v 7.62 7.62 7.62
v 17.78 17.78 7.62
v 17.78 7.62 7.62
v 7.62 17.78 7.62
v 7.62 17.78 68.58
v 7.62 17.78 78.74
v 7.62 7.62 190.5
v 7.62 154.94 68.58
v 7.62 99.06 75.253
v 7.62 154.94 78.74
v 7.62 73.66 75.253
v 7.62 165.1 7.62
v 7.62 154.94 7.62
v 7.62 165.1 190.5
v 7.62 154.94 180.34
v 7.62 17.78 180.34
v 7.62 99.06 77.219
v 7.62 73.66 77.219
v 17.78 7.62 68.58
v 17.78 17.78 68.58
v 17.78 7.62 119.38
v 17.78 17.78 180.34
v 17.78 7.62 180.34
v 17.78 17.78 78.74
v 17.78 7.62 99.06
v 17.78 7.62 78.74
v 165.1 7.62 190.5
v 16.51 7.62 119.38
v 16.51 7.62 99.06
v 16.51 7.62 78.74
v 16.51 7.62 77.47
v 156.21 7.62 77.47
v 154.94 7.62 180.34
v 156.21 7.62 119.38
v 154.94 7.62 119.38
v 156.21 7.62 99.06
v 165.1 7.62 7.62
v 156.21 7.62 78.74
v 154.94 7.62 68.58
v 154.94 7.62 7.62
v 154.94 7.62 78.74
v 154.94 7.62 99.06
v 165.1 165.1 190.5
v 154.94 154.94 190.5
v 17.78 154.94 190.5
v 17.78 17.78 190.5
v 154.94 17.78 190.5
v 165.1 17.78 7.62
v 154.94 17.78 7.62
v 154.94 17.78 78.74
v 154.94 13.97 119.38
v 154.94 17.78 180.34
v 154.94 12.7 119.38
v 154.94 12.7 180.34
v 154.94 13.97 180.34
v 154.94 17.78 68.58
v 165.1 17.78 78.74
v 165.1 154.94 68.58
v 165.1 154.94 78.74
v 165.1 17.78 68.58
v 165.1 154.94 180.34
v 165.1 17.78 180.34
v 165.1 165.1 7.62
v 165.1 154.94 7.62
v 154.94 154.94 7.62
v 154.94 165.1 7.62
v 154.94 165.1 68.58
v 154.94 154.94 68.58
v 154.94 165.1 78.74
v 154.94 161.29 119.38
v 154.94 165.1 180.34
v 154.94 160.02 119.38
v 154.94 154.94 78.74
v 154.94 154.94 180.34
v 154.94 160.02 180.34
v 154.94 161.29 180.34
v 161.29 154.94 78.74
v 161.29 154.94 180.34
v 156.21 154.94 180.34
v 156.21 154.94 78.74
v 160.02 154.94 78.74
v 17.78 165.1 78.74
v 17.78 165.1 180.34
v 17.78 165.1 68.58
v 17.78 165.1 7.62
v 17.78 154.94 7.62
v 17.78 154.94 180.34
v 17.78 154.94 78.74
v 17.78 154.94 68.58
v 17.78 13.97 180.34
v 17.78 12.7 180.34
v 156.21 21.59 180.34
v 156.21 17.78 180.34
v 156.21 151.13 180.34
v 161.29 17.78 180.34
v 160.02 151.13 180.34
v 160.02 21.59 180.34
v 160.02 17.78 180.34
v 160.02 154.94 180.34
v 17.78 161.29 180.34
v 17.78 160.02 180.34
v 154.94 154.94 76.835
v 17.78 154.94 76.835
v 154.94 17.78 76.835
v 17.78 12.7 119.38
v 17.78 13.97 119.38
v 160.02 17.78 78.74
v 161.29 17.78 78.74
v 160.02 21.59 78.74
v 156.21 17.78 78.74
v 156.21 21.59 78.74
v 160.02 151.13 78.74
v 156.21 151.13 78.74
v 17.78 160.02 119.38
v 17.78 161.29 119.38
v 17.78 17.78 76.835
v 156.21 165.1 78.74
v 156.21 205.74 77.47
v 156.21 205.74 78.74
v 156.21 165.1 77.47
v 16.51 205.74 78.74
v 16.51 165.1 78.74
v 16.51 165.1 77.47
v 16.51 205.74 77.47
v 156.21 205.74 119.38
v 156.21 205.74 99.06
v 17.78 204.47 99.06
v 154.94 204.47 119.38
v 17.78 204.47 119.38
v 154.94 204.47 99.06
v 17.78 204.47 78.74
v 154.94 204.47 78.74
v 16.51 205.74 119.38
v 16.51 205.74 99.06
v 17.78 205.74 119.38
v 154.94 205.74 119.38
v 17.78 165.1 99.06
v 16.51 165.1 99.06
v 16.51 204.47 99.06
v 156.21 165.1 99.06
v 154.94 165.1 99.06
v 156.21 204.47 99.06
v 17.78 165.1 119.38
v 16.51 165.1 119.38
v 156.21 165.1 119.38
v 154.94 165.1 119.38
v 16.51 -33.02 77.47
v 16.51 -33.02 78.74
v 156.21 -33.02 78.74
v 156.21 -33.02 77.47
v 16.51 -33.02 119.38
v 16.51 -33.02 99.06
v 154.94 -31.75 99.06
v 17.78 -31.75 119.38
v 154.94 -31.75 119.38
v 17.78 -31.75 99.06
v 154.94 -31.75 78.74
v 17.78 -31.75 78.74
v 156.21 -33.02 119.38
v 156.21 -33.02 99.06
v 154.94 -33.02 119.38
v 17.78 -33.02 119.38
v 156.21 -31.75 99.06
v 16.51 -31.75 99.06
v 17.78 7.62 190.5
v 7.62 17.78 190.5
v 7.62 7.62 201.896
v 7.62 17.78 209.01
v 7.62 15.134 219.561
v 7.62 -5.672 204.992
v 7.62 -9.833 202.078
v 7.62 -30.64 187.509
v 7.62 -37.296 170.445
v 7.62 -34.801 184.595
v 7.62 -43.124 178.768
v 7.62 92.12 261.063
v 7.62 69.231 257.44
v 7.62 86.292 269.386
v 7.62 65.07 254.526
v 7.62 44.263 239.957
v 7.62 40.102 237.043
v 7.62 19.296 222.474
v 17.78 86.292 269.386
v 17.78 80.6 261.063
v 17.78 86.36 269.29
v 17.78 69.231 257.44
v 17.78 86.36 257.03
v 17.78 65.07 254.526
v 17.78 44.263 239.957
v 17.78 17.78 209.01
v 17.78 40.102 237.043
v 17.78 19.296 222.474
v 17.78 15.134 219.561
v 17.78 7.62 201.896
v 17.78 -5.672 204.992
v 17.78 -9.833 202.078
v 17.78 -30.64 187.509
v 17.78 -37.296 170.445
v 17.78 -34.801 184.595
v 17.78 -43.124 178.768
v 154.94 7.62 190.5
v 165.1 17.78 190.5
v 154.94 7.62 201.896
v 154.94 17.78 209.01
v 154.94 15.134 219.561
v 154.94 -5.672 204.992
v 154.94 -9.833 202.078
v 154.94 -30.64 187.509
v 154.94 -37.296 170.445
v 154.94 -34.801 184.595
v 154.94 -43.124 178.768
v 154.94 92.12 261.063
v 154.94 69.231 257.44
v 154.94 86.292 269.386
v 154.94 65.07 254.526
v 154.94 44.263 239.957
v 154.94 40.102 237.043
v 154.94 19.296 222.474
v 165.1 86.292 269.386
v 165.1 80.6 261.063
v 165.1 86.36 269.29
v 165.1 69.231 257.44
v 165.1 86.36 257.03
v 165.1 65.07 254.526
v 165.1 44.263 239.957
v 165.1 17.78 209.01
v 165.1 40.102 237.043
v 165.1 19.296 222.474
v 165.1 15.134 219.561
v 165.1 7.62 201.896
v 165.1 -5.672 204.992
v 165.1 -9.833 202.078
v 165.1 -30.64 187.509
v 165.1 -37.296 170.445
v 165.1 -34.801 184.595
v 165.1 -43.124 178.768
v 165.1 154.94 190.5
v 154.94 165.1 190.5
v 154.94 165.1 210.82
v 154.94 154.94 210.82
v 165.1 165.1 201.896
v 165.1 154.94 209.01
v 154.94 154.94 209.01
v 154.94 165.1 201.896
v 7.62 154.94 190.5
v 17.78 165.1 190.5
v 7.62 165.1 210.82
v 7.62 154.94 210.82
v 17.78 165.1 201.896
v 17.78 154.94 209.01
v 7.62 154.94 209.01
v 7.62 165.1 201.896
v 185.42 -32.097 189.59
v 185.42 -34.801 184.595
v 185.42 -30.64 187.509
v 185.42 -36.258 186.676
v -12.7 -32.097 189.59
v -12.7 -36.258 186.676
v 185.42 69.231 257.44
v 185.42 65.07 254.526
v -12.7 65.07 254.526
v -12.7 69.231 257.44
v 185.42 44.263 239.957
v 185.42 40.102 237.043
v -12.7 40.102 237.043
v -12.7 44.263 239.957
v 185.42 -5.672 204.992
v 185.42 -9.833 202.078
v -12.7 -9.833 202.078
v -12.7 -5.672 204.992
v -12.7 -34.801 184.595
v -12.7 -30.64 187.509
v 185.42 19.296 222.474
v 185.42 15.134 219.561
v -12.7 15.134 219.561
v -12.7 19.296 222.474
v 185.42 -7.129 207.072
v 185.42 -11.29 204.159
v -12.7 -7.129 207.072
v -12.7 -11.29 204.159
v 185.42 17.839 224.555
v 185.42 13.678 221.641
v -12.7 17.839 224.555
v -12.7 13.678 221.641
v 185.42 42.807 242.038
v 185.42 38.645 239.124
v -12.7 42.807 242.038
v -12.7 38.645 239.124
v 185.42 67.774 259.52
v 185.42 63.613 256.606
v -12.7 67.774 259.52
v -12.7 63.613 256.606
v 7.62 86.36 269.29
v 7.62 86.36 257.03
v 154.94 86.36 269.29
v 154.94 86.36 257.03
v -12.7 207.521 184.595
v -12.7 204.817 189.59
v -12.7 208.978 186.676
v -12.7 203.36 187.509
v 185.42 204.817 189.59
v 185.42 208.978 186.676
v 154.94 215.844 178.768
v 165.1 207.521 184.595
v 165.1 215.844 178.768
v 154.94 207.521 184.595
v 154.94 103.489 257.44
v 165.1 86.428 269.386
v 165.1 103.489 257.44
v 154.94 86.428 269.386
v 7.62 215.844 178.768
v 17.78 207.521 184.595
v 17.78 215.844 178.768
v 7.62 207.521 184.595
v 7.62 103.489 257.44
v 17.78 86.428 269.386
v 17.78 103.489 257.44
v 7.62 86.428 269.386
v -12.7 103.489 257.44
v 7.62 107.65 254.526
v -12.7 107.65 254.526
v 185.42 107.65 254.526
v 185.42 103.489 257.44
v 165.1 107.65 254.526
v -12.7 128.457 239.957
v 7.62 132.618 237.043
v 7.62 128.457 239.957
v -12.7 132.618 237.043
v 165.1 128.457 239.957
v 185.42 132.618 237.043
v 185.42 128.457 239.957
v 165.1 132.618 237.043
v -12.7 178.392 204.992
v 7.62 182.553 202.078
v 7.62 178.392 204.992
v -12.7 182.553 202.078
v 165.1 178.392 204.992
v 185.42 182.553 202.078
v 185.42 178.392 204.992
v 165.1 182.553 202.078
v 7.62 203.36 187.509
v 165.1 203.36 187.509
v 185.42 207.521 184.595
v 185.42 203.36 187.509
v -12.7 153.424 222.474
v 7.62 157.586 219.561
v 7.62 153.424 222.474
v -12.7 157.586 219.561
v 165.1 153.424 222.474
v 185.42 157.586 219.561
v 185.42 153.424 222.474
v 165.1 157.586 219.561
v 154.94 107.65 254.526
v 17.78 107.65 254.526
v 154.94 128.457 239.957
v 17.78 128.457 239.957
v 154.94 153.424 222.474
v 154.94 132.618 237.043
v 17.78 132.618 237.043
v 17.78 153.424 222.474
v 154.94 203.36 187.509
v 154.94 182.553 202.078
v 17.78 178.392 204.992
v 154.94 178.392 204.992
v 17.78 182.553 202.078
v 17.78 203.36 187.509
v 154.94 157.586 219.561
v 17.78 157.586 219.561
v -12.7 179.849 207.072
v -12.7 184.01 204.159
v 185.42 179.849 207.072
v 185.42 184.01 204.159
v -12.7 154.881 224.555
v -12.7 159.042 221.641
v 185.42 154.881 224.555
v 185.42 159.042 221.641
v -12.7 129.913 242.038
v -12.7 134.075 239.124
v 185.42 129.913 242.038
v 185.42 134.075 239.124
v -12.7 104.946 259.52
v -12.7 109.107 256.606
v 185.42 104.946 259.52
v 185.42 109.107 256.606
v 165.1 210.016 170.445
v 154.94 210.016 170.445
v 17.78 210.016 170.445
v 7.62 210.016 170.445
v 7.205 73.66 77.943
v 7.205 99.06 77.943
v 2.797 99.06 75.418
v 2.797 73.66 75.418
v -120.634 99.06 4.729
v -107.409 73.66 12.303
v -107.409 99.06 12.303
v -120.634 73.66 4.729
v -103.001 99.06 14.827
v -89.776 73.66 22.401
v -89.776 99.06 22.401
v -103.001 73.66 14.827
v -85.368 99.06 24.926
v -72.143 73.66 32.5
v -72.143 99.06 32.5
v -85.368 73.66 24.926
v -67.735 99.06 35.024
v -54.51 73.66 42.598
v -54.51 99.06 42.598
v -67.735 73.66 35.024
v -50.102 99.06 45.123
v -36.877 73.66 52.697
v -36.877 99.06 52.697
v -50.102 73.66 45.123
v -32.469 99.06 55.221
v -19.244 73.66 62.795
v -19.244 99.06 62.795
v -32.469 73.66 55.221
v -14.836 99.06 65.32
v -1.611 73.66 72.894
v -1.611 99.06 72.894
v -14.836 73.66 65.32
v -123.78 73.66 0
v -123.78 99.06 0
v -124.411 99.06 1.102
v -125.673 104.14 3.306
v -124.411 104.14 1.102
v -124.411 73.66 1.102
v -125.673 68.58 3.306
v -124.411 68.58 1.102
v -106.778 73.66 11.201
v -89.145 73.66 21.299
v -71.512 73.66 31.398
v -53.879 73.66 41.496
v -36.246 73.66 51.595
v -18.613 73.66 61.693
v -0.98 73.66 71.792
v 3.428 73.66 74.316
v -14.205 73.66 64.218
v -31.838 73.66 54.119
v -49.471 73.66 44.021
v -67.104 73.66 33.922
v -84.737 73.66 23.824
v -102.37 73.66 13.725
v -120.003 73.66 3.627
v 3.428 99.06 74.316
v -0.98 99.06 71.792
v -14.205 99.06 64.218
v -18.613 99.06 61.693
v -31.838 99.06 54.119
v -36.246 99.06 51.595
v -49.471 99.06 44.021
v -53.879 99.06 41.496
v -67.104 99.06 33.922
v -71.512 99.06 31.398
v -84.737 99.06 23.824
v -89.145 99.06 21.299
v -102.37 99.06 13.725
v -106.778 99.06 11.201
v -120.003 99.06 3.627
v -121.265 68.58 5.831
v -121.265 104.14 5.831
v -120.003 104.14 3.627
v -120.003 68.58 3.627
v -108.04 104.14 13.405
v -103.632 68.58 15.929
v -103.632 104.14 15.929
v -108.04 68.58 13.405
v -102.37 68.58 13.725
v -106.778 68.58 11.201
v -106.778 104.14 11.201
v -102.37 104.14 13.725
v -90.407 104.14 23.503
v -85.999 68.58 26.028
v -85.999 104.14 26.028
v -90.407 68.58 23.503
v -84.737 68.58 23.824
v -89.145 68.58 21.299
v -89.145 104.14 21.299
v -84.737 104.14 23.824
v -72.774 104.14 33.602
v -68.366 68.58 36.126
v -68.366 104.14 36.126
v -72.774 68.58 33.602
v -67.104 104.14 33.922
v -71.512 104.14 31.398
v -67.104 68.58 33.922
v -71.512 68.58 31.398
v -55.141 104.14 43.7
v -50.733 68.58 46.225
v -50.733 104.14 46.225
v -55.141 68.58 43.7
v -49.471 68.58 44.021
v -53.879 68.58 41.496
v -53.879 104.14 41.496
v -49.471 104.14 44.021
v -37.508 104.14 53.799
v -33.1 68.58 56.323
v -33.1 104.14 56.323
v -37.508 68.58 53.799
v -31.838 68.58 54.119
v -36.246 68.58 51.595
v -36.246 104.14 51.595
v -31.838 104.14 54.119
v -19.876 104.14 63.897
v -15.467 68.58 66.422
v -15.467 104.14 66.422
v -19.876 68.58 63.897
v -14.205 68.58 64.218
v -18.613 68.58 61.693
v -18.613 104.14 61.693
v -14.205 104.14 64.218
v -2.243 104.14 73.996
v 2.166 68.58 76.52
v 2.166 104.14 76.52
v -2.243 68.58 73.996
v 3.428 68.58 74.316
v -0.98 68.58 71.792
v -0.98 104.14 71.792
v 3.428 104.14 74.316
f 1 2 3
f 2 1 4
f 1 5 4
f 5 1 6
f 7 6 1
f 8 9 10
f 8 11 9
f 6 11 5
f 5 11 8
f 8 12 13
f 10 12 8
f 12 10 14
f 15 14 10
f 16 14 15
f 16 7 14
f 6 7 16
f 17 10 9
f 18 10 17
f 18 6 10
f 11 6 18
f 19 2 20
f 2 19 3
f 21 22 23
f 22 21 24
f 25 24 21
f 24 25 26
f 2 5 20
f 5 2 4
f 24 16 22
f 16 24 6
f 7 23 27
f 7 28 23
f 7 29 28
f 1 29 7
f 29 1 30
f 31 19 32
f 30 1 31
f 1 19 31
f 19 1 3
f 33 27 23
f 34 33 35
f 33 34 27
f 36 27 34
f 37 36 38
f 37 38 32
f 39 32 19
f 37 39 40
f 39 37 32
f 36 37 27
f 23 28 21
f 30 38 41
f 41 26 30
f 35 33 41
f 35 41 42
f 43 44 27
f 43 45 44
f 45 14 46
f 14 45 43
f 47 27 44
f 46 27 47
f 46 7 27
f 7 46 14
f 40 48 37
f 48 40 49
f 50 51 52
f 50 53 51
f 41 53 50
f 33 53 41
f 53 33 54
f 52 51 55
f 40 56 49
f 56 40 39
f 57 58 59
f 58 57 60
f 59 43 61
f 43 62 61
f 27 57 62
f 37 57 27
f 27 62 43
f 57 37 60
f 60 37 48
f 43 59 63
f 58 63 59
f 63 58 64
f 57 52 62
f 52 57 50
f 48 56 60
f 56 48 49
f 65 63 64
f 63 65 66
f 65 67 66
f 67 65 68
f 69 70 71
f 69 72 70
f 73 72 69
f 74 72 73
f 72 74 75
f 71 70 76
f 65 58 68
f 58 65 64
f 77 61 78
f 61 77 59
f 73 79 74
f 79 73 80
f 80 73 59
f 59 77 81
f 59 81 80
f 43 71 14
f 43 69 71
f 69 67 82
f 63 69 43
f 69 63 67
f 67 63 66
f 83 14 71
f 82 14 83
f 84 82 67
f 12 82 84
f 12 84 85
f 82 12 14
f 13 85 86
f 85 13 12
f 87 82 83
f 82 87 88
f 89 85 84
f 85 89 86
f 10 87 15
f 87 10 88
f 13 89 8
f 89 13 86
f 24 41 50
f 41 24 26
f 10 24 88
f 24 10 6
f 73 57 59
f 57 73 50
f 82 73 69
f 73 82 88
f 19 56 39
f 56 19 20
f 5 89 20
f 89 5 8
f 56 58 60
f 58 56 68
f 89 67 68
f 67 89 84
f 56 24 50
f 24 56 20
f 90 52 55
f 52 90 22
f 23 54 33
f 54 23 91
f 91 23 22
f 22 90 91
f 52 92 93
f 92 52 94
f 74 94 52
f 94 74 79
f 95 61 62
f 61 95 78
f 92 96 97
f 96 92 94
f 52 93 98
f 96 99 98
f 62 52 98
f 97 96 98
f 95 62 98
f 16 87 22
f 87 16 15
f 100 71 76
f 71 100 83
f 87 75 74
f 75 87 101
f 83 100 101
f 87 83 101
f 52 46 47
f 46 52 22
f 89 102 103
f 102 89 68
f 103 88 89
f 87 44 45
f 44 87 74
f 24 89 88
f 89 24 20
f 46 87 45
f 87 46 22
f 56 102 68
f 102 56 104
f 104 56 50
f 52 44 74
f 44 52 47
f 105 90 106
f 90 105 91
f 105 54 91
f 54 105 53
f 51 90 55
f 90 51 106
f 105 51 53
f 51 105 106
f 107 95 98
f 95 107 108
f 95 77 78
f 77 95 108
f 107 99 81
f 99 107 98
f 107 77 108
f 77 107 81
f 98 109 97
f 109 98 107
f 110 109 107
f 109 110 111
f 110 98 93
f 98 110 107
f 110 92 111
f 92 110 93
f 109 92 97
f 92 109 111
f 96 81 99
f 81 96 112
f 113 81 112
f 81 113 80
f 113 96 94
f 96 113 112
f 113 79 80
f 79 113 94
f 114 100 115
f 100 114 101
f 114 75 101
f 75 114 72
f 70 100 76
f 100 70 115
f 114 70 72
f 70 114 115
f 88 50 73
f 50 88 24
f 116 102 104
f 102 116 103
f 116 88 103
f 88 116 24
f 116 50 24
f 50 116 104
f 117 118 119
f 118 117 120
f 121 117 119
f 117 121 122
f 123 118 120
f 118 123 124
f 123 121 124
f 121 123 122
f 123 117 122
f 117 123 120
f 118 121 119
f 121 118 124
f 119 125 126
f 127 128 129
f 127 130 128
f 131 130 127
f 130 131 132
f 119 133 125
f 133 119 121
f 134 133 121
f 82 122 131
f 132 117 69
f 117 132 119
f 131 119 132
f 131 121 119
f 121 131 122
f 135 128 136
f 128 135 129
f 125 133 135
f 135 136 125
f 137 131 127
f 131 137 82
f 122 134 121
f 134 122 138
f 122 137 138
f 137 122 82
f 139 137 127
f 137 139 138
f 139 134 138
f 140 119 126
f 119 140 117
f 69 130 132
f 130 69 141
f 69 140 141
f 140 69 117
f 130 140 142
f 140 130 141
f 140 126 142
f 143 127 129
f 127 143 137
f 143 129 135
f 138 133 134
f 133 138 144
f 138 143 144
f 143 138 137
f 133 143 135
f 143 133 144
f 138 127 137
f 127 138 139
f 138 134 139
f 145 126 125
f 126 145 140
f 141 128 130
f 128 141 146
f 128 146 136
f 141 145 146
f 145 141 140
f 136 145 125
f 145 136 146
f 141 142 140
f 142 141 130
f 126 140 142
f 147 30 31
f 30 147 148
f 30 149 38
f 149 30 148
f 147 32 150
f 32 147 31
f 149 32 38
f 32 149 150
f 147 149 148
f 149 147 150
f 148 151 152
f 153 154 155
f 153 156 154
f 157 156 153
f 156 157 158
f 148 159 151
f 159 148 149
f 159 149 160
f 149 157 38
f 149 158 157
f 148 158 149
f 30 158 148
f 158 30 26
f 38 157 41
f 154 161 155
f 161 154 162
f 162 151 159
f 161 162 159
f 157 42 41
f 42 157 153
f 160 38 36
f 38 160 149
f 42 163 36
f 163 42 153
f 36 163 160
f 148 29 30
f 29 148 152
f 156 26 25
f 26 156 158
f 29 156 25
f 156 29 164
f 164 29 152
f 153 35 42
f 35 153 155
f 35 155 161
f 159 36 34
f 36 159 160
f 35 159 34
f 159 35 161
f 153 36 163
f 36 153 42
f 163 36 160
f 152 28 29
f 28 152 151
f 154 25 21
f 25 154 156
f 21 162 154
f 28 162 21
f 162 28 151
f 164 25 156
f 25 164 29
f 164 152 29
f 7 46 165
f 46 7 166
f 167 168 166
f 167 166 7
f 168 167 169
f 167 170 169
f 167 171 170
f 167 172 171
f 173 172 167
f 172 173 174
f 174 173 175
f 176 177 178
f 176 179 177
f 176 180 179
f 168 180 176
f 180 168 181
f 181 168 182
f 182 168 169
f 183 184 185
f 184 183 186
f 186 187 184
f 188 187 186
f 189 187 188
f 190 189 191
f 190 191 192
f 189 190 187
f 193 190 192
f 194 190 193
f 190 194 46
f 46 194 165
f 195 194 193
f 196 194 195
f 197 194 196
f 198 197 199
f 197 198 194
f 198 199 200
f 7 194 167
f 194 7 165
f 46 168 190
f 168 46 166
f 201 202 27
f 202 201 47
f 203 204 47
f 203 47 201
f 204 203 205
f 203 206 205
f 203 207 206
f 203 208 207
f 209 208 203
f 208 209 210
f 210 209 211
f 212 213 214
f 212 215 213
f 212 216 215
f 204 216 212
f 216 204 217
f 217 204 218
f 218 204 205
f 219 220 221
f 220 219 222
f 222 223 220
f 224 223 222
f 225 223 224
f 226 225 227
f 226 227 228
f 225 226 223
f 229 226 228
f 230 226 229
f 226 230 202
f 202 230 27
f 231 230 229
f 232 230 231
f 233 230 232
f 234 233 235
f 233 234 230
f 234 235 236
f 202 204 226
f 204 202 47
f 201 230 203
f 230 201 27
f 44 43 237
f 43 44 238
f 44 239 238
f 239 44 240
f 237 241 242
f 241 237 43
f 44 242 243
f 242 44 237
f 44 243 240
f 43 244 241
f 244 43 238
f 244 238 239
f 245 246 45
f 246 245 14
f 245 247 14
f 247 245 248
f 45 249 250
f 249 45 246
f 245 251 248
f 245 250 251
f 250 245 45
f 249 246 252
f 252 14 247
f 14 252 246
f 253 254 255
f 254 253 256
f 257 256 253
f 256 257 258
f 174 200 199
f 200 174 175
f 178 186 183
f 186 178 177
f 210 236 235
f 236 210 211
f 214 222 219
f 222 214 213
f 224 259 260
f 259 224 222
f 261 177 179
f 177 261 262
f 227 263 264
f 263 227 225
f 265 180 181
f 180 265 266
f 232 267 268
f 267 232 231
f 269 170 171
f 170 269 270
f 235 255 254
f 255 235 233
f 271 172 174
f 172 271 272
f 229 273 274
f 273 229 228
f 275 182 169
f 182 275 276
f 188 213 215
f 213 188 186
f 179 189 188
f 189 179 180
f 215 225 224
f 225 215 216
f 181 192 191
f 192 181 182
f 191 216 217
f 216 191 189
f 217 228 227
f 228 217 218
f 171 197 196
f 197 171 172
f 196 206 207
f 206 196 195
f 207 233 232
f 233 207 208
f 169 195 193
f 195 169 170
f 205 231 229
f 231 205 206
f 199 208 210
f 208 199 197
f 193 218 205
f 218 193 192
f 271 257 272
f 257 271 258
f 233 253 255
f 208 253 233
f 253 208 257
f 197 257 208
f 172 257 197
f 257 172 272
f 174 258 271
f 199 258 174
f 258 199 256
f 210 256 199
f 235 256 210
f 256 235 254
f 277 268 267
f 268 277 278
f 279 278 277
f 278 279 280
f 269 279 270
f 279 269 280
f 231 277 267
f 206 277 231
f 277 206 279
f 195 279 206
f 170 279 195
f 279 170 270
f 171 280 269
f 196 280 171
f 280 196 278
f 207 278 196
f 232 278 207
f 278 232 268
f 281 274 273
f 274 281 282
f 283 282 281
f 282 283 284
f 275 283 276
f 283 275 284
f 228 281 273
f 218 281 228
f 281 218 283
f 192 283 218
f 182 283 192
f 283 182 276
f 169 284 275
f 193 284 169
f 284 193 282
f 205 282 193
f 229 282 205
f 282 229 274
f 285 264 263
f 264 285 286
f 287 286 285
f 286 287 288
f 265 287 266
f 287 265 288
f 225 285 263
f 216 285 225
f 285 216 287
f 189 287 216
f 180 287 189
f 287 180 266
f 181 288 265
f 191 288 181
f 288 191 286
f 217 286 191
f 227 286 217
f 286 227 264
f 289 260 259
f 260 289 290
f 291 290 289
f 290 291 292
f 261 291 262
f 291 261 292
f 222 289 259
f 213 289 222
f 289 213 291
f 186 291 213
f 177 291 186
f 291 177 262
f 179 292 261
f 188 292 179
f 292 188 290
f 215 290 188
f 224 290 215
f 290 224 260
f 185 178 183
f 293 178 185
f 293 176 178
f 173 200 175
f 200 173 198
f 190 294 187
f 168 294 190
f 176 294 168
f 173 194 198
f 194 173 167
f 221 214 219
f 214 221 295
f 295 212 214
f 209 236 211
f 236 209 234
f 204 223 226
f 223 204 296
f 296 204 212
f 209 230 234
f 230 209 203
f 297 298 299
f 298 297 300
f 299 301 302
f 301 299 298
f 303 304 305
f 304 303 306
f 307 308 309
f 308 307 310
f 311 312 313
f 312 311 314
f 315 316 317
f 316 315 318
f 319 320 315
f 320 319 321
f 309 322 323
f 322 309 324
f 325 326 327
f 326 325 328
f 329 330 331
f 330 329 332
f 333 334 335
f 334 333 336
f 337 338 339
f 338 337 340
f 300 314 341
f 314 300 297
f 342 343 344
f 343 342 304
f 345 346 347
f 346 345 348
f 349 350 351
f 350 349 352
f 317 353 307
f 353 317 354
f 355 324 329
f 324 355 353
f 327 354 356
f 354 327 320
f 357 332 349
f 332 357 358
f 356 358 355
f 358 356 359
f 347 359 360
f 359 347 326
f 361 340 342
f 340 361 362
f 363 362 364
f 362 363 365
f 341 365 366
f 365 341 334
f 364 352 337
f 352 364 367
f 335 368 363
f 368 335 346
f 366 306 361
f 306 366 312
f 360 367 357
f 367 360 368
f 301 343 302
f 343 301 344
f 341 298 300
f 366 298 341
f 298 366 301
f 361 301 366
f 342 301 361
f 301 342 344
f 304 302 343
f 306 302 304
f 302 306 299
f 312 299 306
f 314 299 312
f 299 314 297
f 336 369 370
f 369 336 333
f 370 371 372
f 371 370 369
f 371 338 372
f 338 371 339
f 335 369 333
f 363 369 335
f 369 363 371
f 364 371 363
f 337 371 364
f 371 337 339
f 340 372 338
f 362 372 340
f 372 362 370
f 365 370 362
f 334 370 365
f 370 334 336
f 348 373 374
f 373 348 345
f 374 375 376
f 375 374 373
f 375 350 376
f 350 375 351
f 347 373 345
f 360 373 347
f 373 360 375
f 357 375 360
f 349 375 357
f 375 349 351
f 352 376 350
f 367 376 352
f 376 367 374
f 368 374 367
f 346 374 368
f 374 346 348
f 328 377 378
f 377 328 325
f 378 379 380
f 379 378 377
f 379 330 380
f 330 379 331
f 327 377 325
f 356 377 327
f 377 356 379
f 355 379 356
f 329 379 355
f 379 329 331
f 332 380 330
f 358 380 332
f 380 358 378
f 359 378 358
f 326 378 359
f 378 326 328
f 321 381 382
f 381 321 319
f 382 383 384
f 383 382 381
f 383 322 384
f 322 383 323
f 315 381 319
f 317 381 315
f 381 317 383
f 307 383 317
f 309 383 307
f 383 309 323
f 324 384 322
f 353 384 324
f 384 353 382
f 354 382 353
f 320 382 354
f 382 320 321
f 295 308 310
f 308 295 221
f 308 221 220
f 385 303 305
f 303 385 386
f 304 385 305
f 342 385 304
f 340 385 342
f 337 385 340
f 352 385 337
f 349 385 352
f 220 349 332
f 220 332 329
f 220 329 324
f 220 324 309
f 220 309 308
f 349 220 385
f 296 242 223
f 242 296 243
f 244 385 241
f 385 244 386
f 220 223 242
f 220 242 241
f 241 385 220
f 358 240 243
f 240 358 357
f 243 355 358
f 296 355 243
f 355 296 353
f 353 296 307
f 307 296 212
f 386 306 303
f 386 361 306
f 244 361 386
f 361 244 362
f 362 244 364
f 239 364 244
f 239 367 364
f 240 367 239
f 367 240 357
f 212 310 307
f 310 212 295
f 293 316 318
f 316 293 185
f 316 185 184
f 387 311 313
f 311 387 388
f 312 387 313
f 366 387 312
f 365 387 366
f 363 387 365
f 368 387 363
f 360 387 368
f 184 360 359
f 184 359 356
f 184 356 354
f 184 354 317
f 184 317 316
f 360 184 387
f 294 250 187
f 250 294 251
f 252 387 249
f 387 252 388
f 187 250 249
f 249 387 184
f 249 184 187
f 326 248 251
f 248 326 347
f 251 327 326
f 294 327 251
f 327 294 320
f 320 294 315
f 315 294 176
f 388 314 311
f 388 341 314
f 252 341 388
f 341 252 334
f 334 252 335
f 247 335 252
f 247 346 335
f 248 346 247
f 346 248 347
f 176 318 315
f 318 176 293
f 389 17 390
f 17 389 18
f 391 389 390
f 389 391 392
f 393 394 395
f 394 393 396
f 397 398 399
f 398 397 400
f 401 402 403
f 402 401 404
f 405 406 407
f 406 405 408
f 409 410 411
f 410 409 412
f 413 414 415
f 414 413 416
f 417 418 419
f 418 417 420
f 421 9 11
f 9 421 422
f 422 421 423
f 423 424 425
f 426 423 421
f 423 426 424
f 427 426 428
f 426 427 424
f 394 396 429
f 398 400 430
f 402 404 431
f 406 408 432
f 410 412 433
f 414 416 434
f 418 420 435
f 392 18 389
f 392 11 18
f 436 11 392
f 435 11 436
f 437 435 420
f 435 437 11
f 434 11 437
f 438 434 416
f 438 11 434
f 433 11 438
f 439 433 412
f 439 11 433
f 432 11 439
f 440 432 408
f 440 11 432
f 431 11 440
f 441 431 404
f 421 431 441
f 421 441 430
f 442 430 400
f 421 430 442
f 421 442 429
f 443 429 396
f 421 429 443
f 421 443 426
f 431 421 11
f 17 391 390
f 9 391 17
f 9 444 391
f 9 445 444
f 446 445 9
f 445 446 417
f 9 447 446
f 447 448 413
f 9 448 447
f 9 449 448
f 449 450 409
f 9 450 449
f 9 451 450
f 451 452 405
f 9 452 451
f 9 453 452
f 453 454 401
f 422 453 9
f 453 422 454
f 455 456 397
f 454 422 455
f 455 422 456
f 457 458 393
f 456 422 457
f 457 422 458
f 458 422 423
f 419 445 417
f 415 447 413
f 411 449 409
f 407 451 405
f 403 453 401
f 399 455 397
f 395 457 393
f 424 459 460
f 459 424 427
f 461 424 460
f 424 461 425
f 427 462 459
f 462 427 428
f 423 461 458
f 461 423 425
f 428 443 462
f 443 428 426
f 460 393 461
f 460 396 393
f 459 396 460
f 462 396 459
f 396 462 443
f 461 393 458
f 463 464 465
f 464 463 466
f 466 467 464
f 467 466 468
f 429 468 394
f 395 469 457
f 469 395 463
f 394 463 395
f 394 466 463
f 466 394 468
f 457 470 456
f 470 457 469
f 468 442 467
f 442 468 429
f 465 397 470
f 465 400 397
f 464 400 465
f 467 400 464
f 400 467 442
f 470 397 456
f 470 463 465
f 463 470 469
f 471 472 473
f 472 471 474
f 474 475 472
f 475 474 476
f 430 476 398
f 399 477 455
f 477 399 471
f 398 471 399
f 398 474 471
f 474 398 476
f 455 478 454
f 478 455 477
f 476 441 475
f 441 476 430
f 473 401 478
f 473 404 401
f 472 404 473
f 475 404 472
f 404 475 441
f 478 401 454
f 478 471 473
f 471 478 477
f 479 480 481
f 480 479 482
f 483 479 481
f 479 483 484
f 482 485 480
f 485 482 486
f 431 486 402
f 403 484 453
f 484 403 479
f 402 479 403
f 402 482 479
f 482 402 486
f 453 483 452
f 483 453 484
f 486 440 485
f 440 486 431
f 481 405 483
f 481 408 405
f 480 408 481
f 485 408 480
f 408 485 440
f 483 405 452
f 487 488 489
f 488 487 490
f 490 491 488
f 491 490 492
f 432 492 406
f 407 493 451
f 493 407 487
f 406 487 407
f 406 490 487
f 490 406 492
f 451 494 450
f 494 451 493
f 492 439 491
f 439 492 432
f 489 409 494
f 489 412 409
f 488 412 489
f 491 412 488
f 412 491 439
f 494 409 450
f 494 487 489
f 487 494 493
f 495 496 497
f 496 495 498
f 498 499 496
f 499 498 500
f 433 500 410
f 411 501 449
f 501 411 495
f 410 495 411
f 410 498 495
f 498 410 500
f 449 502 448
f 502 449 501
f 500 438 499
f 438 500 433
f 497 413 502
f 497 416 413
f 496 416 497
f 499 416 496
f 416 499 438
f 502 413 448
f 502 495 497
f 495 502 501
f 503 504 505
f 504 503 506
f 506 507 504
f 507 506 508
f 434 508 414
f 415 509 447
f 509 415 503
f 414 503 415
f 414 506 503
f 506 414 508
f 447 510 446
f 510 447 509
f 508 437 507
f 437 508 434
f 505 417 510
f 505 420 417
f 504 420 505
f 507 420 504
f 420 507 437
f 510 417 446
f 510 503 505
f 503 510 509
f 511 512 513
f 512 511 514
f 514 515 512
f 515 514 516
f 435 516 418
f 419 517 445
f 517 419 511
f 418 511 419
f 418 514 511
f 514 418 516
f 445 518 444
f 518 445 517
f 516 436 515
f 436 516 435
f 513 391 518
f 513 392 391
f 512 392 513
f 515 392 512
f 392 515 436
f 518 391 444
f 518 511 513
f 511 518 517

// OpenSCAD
// file: ladder.scad
/**
 * @file ladder.scad
 * @brief TODO.
 *
 */

module ladder_board()
{
    board_size = [
            LADDER_BOARD_LENGTH,
            LADDER_BOARD_WIDTH,
            LADDER_BOARD_THICKNESS];

    color("Chocolate")
        board(board_size);
}

module ladder_cross_board()
{
    board_size = [
            LADDER_CROSS_BOARD_LENGTH,
            LADDER_CROSS_BOARD_WIDTH,
            LADDER_CROSS_BOARD_THICKNESS];

    color("Peru")
        translate([LADDER_CROSS_BOARD_WIDTH, 0, 0])
            rotate([0, 0, 90])
                board(board_size);
}

module ladder_boards_assembly()
{
    for(b = [0:LADDER_BOARD_COUNT - 1])
    {
        translate([0, b * LADDER_BOARD_WIDTH, 0])
            ladder_board();
    }
}

module ladder_cross_boards_assembly()
{
    for(b = [0:LADDER_CROSS_BOARD_COUNT - 1])
    {
        offset_b = [
                b * (LADDER_CROSS_BOARD_SPACING + LADDER_CROSS_BOARD_WIDTH),
                -LADDER_CROSS_BOARD_OVERRUN,
                LADDER_BOARD_THICKNESS / 2];

        translate(offset_b)
            ladder_cross_board();
    }
}

module ladder_assembly()
{
    ladder_boards_assembly();

    ladder_cross_boards_assembly();
}

module ladder()
{
    ladder_offset = [
            -LADDER_BOARD_LENGTH + 21.0,
            (FRAME_HORIZ_POST_BOARD_LENGTH / 2)
            - ((LADDER_BOARD_COUNT * LADDER_BOARD_WIDTH) / 2),
            -FOUNDATION_BASE_HEIGHT / 2];

    translate(ladder_offset)
        rotate([0, -LADDER_ANGLE, 0])
            ladder_assembly();
}
// file: roof.scad
/**
 * @file roof.scad
 * @brief TODO.
 *
 */

module roof_vert_post_board()
{
    board_size = [
            ROOF_VERT_POST_BOARD_LENGTH,
            POST_BOARD_WIDTH,
            POST_BOARD_THICKNESS];

    color("SaddleBrown")
        translate([POST_BOARD_THICKNESS, 0, 0])
            rotate([0, -90, 0])
                board(board_size);
}

module roof_support_beam_board()
{
    board_size = [
            ROOF_SUPPORT_BEAM_BOARD_LENGTH,
            POST_BOARD_WIDTH,
            POST_BOARD_THICKNESS];

    color("SaddleBrown")
        translate([POST_BOARD_THICKNESS, 0, 0])
            rotate([0, 0, 90])
                board(board_size);
}

module roof_cross_board()
{
    board_size = [
            ROOF_CROSS_BOARD_LENGTH,
            ROOF_CROSS_BOARD_WIDTH,
            ROOF_CROSS_BOARD_THICKNESS];

    color("Peru")
        board(board_size);
}

module roof_vert_posts()
{
    dist_a =
            + FOUNDATION_BASE_SIZE
            + FOUNDATION_BASE_DISTANCE;

    roof_vert_post_board();

    translate([dist_a, 0, 0])
        roof_vert_post_board();

    translate([dist_a, dist_a, 0])
        roof_vert_post_board();

    translate([0, dist_a, 0])
        roof_vert_post_board();
}

module roof_panel_assembly()
{
    support_offset = [
            FOUNDATION_BASE_SIZE
                    + FOUNDATION_BASE_DISTANCE,
            0,
            0];

    roof_support_beam_board();

    translate(support_offset)
        roof_support_beam_board();

    dist = ROOF_CROSS_BOARD_WIDTH + ROOF_CROSS_BOARD_SPACING;

    for(b = [0:ROOF_CROSS_BOARD_COUNT - 1])
    {
        offset_b = [
                -ROOF_CROSS_BOARD_OVERRUN,
                ROOF_CROSS_BOARD_START_OFFSET
                        + (b * dist),
                POST_BOARD_THICKNESS];

        translate(offset_b)
            roof_cross_board();
    }
}

module roof_assembly()
{
    roof_vert_posts();

    panel_size = [
            ROOF_PANEL_LENGTH,
            ROOF_PANEL_WIDTH,
            ROOF_PANEL_THICKNESS];

    depth =
            ROOF_VERT_POST_BOARD_LENGTH
            + (POST_BOARD_THICKNESS / 2);

    right_offset = [
            0,
            -ROOF_CENTER_OFFSET,
            depth];

    right_panel_offset = [
            -ROOF_CROSS_BOARD_OVERRUN / 2,
            ROOF_CROSS_BOARD_OVERRUN / 2,
            POST_BOARD_THICKNESS
                    + ROOF_CROSS_BOARD_THICKNESS];

    left_offset = [
            FOUNDATION_BASE_SIZE
                    + FOUNDATION_BASE_DISTANCE
                    + POST_BOARD_THICKNESS,
            FRAME_HORIZ_POST_BOARD_LENGTH
                    + ROOF_CENTER_OFFSET,
            depth];

    translate(right_offset)
        rotate([ROOF_ANGLE, 0, 0])
            translate([0, -ROOF_SUPPORT_BEAM_OVERRUN, 0])
            {
                roof_panel_assembly();

                translate(right_panel_offset)
                    %cube(panel_size);
            }

    translate(left_offset)
        rotate([-ROOF_ANGLE, 0, 0])
            translate([0, ROOF_SUPPORT_BEAM_OVERRUN, 0])
                rotate([0, 0, 180])
                {
                    roof_panel_assembly();

                    translate(right_panel_offset)
                        %cube(panel_size);
                }
}

module roof()
{
    roof_offset = [
            0,
            0,
            FRAME_VERT_POST_BOARD_LENGTH];

    translate(roof_offset)
        roof_assembly();
}
// file: nesting_box.scad
/**
 * @file nesting_box.scad
 * @brief TODO.
 *
 */

module nexting_box_board()
{
    board_size = [
            WALL_BOARD_LENGTH
                    + (2 * WALL_BOARD_THICKNESS),
            WALL_BOARD_WIDTH,
            WALL_BOARD_THICKNESS];

    board(board_size);
}

module nexting_box_end_board()
{
    total_size = NESTING_BOX_HEIGHT;

    count = floor(total_size / WALL_BOARD_WIDTH);

    board_size = [
            count * WALL_BOARD_WIDTH,
            WALL_BOARD_WIDTH,
            WALL_BOARD_THICKNESS];

    board(board_size);
}

module nesting_box_base()
{
    total_size = NESTING_BOX_HEIGHT;

    count = floor(total_size / WALL_BOARD_WIDTH);

    for(b = [0:count - 1])
    {
        translate([-WALL_BOARD_THICKNESS, b * WALL_BOARD_WIDTH, 0])
            nexting_box_board();
    }
}

module nesting_box_side()
{
    total_size = NESTING_BOX_HEIGHT;

    count = floor(total_size / WALL_BOARD_WIDTH);

    side_offset = [
            0,
            count * WALL_BOARD_WIDTH,
            WALL_BOARD_THICKNESS];

    translate(side_offset)
        rotate([90, 0, 0])
            for(b = [0:count - 1])
            {
                translate([-WALL_BOARD_THICKNESS, b * WALL_BOARD_WIDTH, 0])
                    nexting_box_board();
            }
}

module nesting_box_ends()
{
    total_size = NESTING_BOX_HEIGHT;

    count = floor(total_size / WALL_BOARD_WIDTH);

    end_offset = [
            0,
            0,
            WALL_BOARD_THICKNESS];

    dist =
            WALL_BOARD_LENGTH
            - WALL_BOARD_THICKNESS
            + (2 * WALL_BOARD_THICKNESS);

    translate(end_offset)
        rotate([90, 0, 90])
            for(b = [0:count - 1])
            {
                translate([0, b * WALL_BOARD_WIDTH, -WALL_BOARD_THICKNESS])
                {
                    nexting_box_end_board();

                    translate([0, 0, dist])
                        nexting_box_end_board();
                }
            }
}

module nesting_box()
{
    nesting_box_base();

    nesting_box_side();

    nesting_box_ends();
}

module nesting_box_left()
{
    box_offset = [
            POST_BOARD_WIDTH,
            FOUNDATION_BASE_DISTANCE
                    + FOUNDATION_BASE_SIZE
                    + POST_BOARD_WIDTH,
            FRAME_BASE_HEIGHT
                    + POST_BOARD_THICKNESS
                    - WALL_BOARD_THICKNESS];

    translate(box_offset)
        nesting_box();
}

module nesting_box_right()
{
    box_offset = [
            POST_BOARD_WIDTH
                    + WALL_BOARD_LENGTH,
            0,
            FRAME_BASE_HEIGHT
                    + POST_BOARD_THICKNESS
                    - WALL_BOARD_THICKNESS];

    translate(box_offset)
        rotate([0, 0, 180])
            nesting_box();
}
// file: flooring.scad
/**
 * @file flooring.scad
 * @brief TODO.
 *
 */

module flooring_board()
{
    board_size = [
            FLOOR_BOARD_LENGTH,
            FLOOR_BOARD_WIDTH,
            FLOOR_BOARD_THICKNESS];

    board(board_size);
}

module flooring()
{
    assembly_offset = [
            POST_BOARD_THICKNESS,
            POST_BOARD_WIDTH,
            FRAME_BASE_HEIGHT
                    + POST_BOARD_THICKNESS
                    - FLOOR_BOARD_THICKNESS];

    total_width =
            FOUNDATION_BASE_DISTANCE
            + FOUNDATION_BASE_SIZE
            - POST_BOARD_WIDTH;

    count = floor(total_width / FLOOR_BOARD_WIDTH);

    translate(assembly_offset)
    {
        for(b = [0:count - 1])
        {
            translate([0, b * FLOOR_BOARD_WIDTH, 0])
                flooring_board();
        }
    }
}
// file: walls.scad
/**
 * @file walls.scad
 * @brief TODO.
 *
 */

module walls_standard_board()
{
    board_size = [
            WALL_BOARD_LENGTH,
            WALL_BOARD_WIDTH,
            WALL_BOARD_THICKNESS];

    translate([0, WALL_BOARD_THICKNESS, 0])
        rotate([90, 0, 0])
            board(board_size);
}

module walls_support_board()
{
    board_size = [
            WALL_SUPPORT_BOARD_LENGTH,
            WALL_SUPPORT_BOARD_WIDTH,
            WALL_SUPPORT_BOARD_THICKNESS];

    translate([WALL_SUPPORT_BOARD_WIDTH, WALL_SUPPORT_BOARD_THICKNESS, 0])
        rotate([90, -90, 0])
            board(board_size);
}

module walls_front_door_board()
{
    hole_height = WALL_DOOR_HEIGHT_BOARD_COUNT * WALL_BOARD_WIDTH;
    hole_width = WALL_DOOR_WIDTH_BOARD_COUNT * WALL_BOARD_WIDTH;

    offset_b = (WALL_BOARD_LENGTH / 2) + (hole_width / 2);

    board_size = [
            (WALL_BOARD_LENGTH / 2)
                    - (hole_width / 2),
            WALL_BOARD_WIDTH,
            WALL_BOARD_THICKNESS];

    translate([0, WALL_BOARD_THICKNESS, 0])
        rotate([90, 0, 0])
        {
            board(board_size);

            translate([offset_b, 0, 0])
                board(board_size);
        }
}

module walls_type_solid()
{
    total_width =
            FRAME_TOP_HEIGHT
            - FRAME_BASE_HEIGHT
            - POST_BOARD_THICKNESS;

    count = floor(total_width / WALL_BOARD_WIDTH);

    for(w = [0:count - 1])
    {
        translate([0, 0, w * WALL_BOARD_WIDTH])
            walls_standard_board();
    }
}

module walls_type_front_door()
{
    assert(WALL_DOOR_HEIGHT_BOARD_COUNT > 0);
    assert(WALL_DOOR_WIDTH_BOARD_COUNT > 0);

    total_width =
            FRAME_TOP_HEIGHT
            - FRAME_BASE_HEIGHT
            - POST_BOARD_THICKNESS;

    count = floor(total_width / WALL_BOARD_WIDTH);

    for(w = [0:count - 1])
    {
        translate([0, 0, w * WALL_BOARD_WIDTH])
            if(w <= (WALL_DOOR_HEIGHT_BOARD_COUNT - 1))
            {
                walls_front_door_board();
            }
            else
            {
                walls_standard_board();
            }
    }
}

module walls_type_nesting_box()
{
    assert((NESTING_BOX_HEIGHT % WALL_BOARD_WIDTH) == 0);

    total_width =
            FRAME_TOP_HEIGHT
            - FRAME_BASE_HEIGHT
            - POST_BOARD_THICKNESS;

    count = floor(total_width / WALL_BOARD_WIDTH);

    for(w = [0:count - 1])
    {
        if((w * WALL_BOARD_WIDTH) >= NESTING_BOX_HEIGHT)
        {
            translate([0, 0, w * WALL_BOARD_WIDTH])
                walls_standard_board();
        }
    }
}

module walls_side_right()
{
    wall_offset = [
            POST_BOARD_THICKNESS,
            POST_BOARD_WIDTH / 2,
            FRAME_BASE_HEIGHT + POST_BOARD_THICKNESS];

    translate(wall_offset)
        walls_type_nesting_box();
}

module walls_side_back()
{
    wall_offset = [
            WALL_BOARD_THICKNESS
                    + FRAME_HORIZ_POST_BOARD_LENGTH
                    - (POST_BOARD_WIDTH / 2),
            POST_BOARD_THICKNESS,
            FRAME_BASE_HEIGHT + POST_BOARD_THICKNESS];

    translate(wall_offset)
        rotate([0, 0, 90])
        {
            walls_type_solid();

            translate([0, WALL_BOARD_THICKNESS, 0])
            {
                walls_support_board();

                translate([WALL_BOARD_LENGTH - WALL_SUPPORT_BOARD_WIDTH, 0, 0])
                    walls_support_board();
            }
        }
}

module walls_side_left()
{
    wall_offset = [
            POST_BOARD_THICKNESS,
            FRAME_HORIZ_POST_BOARD_LENGTH
                    - (POST_BOARD_WIDTH / 2),
            FRAME_BASE_HEIGHT + POST_BOARD_THICKNESS];

    translate(wall_offset)
        walls_type_nesting_box();
}

module walls_side_front()
{
    wall_offset = [
            WALL_BOARD_THICKNESS
                    + (POST_BOARD_WIDTH / 2),
            POST_BOARD_THICKNESS,
            FRAME_BASE_HEIGHT + POST_BOARD_THICKNESS];

    translate(wall_offset)
        rotate([0, 0, 90])
        {
            walls_type_front_door();

            translate([0, -WALL_SUPPORT_BOARD_THICKNESS, 0])
            {
                walls_support_board();

                translate([WALL_BOARD_LENGTH - WALL_SUPPORT_BOARD_WIDTH, 0, 0])
                    walls_support_board();
            }
        }
}

module walls()
{
    walls_side_right();

    walls_side_back();

    walls_side_left();

    //walls_side_front();
}
// file: frame.scad
/**
 * @file frame.scad
 * @brief TODO.
 *
 */

module frame_vert_post()
{
    board_size = [
            FRAME_VERT_POST_BOARD_LENGTH,
            POST_BOARD_WIDTH,
            POST_BOARD_THICKNESS];

    translate([POST_BOARD_THICKNESS, 0, 0])
        rotate([0, -90, 0])
            board(board_size);
}

module frame_horiz_post()
{
    board_size = [
            FRAME_HORIZ_POST_BOARD_LENGTH,
            POST_BOARD_WIDTH,
            POST_BOARD_THICKNESS];

    board(board_size);
}

module frame_base_vert_posts()
{
    dist_a =
            + FOUNDATION_BASE_SIZE
            + FOUNDATION_BASE_DISTANCE;

    frame_vert_post();

    translate([dist_a, 0, 0])
        frame_vert_post();

    translate([dist_a, dist_a, 0])
        frame_vert_post();

    translate([0, dist_a, 0])
        frame_vert_post();
}

module frame_base_horiz_posts()
{
    dist_a =
            + FOUNDATION_BASE_SIZE
            + FOUNDATION_BASE_DISTANCE;

    translate([0, 0, FRAME_BASE_HEIGHT])
        frame_horiz_post();

    translate([0, 0, FRAME_TOP_HEIGHT])
        frame_horiz_post();

    translate([0, dist_a, FRAME_BASE_HEIGHT])
        frame_horiz_post();

    translate([0, dist_a, FRAME_TOP_HEIGHT])
        frame_horiz_post();

    translate([POST_BOARD_WIDTH, 0, FRAME_BASE_HEIGHT])
        rotate([0, 0, 90])
            frame_horiz_post();

    translate([POST_BOARD_WIDTH, 0, FRAME_TOP_HEIGHT])
        rotate([0, 0, 90])
            frame_horiz_post();

    translate([POST_BOARD_WIDTH + dist_a, 0, FRAME_BASE_HEIGHT])
        rotate([0, 0, 90])
            frame_horiz_post();

    translate([POST_BOARD_WIDTH + dist_a, 0, FRAME_TOP_HEIGHT])
        rotate([0, 0, 90])
            frame_horiz_post();
}

module frame()
{
    frame_base_vert_posts();

    frame_base_horiz_posts();
}
// file: foundation.scad
/**
 * @file foundation.scad
 * @brief TODO.
 *
 */

module foundation_base()
{
    base_size = [
            FOUNDATION_BASE_SIZE,
            FOUNDATION_BASE_SIZE,
            FOUNDATION_BASE_HEIGHT];

    translate([0, 0, -FOUNDATION_BASE_HEIGHT/2])
        cube(base_size);
}

module foundation()
{
    dist = FOUNDATION_BASE_DISTANCE + FOUNDATION_BASE_SIZE;

    foundation_base();

    translate([dist, 0, 0])
        foundation_base();

    translate([dist, dist, 0])
        foundation_base();

    translate([0, dist, 0])
        foundation_base();
}
// file: common/board.scad
// board.scad

BOARD_DEFAULT_LENGTH = 600;
BOARD_DEFAULT_WIDTH = 120;
BOARD_DEFAULT_THICKNESS = 120;

function board_get_default_size()
    = [BOARD_DEFAULT_LENGTH, BOARD_DEFAULT_WIDTH, BOARD_DEFAULT_THICKNESS];

module board(size = board_get_default_size(), center = false)
{
    // size[0] is always with the grain
    // size[1] is against the grain
    // size[2] is the board thickness
    cube(size = size, center = center);
}
// file: common/common_functions.scad
// common_functions.scad

function get_visual_overrun() = 0.1;

function ft_to_cm(ft) = ft * 30.48;

function cm_to_ft(cm) = cm / 30.48;

function in_to_cm(in) = in * 2.54;

function cm_to_in(cm) = cm / 2.54;
// main file
/**
 * @file chicken_coop.scad
 * @brief TODO.
 *
 * Units: centimeters
 *
 * roof idea: https://upload.wikimedia.org/wikipedia/commons/thumb/5/59/Kasai_sumiyoshi-jinja03s3200crop.jpg/1200px-Kasai_sumiyoshi-jinja03s3200crop.jpg
 *
 * http://s3.amazonaws.com/finehomebuilding.s3.tauntoncloud.com/app/uploads/2016/04/09094233/021224108-1-main.jpg
 *
 */

// modules/functions
use <common/common_functions.scad>
use <common/board.scad>

// constants
POST_BOARD_WIDTH = in_to_cm(4.0);
POST_BOARD_THICKNESS = POST_BOARD_WIDTH;

FOUNDATION_BASE_DISTANCE = ft_to_cm(4.0);
FOUNDATION_BASE_SIZE = in_to_cm(10.0);
FOUNDATION_BASE_HEIGHT = in_to_cm(6.0);

FRAME_VERT_POST_BOARD_LENGTH = ft_to_cm(6.0);
FRAME_HORIZ_POST_BOARD_LENGTH =
        FOUNDATION_BASE_DISTANCE
        + POST_BOARD_WIDTH
        + FOUNDATION_BASE_SIZE;

FRAME_BASE_HEIGHT = ft_to_cm(2.0);
FRAME_TOP_HEIGHT =
        FRAME_VERT_POST_BOARD_LENGTH
        - POST_BOARD_THICKNESS;

WALL_DOOR_HEIGHT_BOARD_COUNT = 2;
WALL_DOOR_WIDTH_BOARD_COUNT = 2;

WALL_BOARD_LENGTH =
        FOUNDATION_BASE_DISTANCE
        + FOUNDATION_BASE_SIZE
        - POST_BOARD_WIDTH;
WALL_BOARD_WIDTH = in_to_cm(8.0);
WALL_BOARD_THICKNESS = in_to_cm(0.5);

WALL_SUPPORT_BOARD_LENGTH =
        FRAME_TOP_HEIGHT
            - FRAME_BASE_HEIGHT
            - POST_BOARD_THICKNESS;
WALL_SUPPORT_BOARD_WIDTH = in_to_cm(1.5);
WALL_SUPPORT_BOARD_THICKNESS = in_to_cm(1.5);

FLOOR_BOARD_LENGTH =
        FOUNDATION_BASE_DISTANCE
        + FOUNDATION_BASE_SIZE
        - POST_BOARD_WIDTH;
FLOOR_BOARD_WIDTH = in_to_cm(6.0);
FLOOR_BOARD_THICKNESS = in_to_cm(0.75);

// must be a multiple of WALL_BOARD_WIDTH
NESTING_BOX_HEIGHT = in_to_cm(16.0);

// height is adjusted with this parameter
ROOF_VERT_POST_BOARD_LENGTH = in_to_cm(8.0);

ROOF_ANGLE = 35.0;
ROOF_CENTER_OFFSET = -20.0;
ROOF_SUPPORT_BEAM_OVERRUN = ft_to_cm(2.6);
ROOF_SUPPORT_BEAM_BOARD_LENGTH =
        (FRAME_HORIZ_POST_BOARD_LENGTH / 2)
        + ROOF_SUPPORT_BEAM_OVERRUN;

ROOF_CROSS_BOARD_OVERRUN = in_to_cm(8.0);
ROOF_CROSS_BOARD_LENGTH =
        FRAME_HORIZ_POST_BOARD_LENGTH
        + (2 * ROOF_CROSS_BOARD_OVERRUN);
ROOF_CROSS_BOARD_WIDTH = in_to_cm(2.0);
ROOF_CROSS_BOARD_THICKNESS = in_to_cm(1.0);

ROOF_CROSS_BOARD_START_OFFSET = in_to_cm(4.0);
ROOF_CROSS_BOARD_COUNT = 5;
ROOF_CROSS_BOARD_SPACING = in_to_cm(10.0);

ROOF_PANEL_LENGTH =
        ROOF_CROSS_BOARD_LENGTH
        - ROOF_CROSS_BOARD_OVERRUN;
ROOF_PANEL_WIDTH =
        ROOF_SUPPORT_BEAM_BOARD_LENGTH
        - (ROOF_CROSS_BOARD_OVERRUN / 2);
ROOF_PANEL_THICKNESS = 1.0;

LADDER_ANGLE = 29.8;
LADDER_BOARD_COUNT = 5;

LADDER_BOARD_LENGTH = ft_to_cm(5.0);
LADDER_BOARD_WIDTH = in_to_cm(2.0);
LADDER_BOARD_THICKNESS = in_to_cm(1.0);

LADDER_CROSS_BOARD_COUNT = 8;
LADDER_CROSS_BOARD_OVERRUN = in_to_cm(2.0);
LADDER_CROSS_BOARD_SPACING = in_to_cm(6.0);

LADDER_CROSS_BOARD_LENGTH =
        (LADDER_BOARD_WIDTH * LADDER_BOARD_COUNT)
        + (2 * LADDER_CROSS_BOARD_OVERRUN);
LADDER_CROSS_BOARD_WIDTH = in_to_cm(2.0);
LADDER_CROSS_BOARD_THICKNESS = in_to_cm(1.0);

// includes
include <foundation.scad>
include <frame.scad>
include <walls.scad>
include <flooring.scad>
include <nesting_box.scad>
include <roof.scad>
include <ladder.scad>

module chicken_coop()
{
    color("SaddleBrown")
        frame();

    color("Peru")
        walls();
    %walls_side_front();

    color("Chocolate")
        flooring();

    color("Peru")
        nesting_box_left();

    color("Peru")
        nesting_box_right();

    roof();

    ladder();
}

module chicken_coop_demo()
{
    foundation_dist =
            (FOUNDATION_BASE_SIZE / 2)
            - (POST_BOARD_THICKNESS / 2);

    foundation_offset = [
            foundation_dist,
            foundation_dist,
            FOUNDATION_BASE_HEIGHT / 2];

    floor_size = [
            2 * FOUNDATION_BASE_DISTANCE,
            2 * FOUNDATION_BASE_DISTANCE,
            0.1];

    floor_offset = [
            -floor_size[0]/6,
            -floor_size[1]/6,
            -floor_size[2]];

    translate(floor_offset)
        %cube(floor_size);

    %foundation();

    translate(foundation_offset)
        chicken_coop();
}

chicken_coop_demo();
